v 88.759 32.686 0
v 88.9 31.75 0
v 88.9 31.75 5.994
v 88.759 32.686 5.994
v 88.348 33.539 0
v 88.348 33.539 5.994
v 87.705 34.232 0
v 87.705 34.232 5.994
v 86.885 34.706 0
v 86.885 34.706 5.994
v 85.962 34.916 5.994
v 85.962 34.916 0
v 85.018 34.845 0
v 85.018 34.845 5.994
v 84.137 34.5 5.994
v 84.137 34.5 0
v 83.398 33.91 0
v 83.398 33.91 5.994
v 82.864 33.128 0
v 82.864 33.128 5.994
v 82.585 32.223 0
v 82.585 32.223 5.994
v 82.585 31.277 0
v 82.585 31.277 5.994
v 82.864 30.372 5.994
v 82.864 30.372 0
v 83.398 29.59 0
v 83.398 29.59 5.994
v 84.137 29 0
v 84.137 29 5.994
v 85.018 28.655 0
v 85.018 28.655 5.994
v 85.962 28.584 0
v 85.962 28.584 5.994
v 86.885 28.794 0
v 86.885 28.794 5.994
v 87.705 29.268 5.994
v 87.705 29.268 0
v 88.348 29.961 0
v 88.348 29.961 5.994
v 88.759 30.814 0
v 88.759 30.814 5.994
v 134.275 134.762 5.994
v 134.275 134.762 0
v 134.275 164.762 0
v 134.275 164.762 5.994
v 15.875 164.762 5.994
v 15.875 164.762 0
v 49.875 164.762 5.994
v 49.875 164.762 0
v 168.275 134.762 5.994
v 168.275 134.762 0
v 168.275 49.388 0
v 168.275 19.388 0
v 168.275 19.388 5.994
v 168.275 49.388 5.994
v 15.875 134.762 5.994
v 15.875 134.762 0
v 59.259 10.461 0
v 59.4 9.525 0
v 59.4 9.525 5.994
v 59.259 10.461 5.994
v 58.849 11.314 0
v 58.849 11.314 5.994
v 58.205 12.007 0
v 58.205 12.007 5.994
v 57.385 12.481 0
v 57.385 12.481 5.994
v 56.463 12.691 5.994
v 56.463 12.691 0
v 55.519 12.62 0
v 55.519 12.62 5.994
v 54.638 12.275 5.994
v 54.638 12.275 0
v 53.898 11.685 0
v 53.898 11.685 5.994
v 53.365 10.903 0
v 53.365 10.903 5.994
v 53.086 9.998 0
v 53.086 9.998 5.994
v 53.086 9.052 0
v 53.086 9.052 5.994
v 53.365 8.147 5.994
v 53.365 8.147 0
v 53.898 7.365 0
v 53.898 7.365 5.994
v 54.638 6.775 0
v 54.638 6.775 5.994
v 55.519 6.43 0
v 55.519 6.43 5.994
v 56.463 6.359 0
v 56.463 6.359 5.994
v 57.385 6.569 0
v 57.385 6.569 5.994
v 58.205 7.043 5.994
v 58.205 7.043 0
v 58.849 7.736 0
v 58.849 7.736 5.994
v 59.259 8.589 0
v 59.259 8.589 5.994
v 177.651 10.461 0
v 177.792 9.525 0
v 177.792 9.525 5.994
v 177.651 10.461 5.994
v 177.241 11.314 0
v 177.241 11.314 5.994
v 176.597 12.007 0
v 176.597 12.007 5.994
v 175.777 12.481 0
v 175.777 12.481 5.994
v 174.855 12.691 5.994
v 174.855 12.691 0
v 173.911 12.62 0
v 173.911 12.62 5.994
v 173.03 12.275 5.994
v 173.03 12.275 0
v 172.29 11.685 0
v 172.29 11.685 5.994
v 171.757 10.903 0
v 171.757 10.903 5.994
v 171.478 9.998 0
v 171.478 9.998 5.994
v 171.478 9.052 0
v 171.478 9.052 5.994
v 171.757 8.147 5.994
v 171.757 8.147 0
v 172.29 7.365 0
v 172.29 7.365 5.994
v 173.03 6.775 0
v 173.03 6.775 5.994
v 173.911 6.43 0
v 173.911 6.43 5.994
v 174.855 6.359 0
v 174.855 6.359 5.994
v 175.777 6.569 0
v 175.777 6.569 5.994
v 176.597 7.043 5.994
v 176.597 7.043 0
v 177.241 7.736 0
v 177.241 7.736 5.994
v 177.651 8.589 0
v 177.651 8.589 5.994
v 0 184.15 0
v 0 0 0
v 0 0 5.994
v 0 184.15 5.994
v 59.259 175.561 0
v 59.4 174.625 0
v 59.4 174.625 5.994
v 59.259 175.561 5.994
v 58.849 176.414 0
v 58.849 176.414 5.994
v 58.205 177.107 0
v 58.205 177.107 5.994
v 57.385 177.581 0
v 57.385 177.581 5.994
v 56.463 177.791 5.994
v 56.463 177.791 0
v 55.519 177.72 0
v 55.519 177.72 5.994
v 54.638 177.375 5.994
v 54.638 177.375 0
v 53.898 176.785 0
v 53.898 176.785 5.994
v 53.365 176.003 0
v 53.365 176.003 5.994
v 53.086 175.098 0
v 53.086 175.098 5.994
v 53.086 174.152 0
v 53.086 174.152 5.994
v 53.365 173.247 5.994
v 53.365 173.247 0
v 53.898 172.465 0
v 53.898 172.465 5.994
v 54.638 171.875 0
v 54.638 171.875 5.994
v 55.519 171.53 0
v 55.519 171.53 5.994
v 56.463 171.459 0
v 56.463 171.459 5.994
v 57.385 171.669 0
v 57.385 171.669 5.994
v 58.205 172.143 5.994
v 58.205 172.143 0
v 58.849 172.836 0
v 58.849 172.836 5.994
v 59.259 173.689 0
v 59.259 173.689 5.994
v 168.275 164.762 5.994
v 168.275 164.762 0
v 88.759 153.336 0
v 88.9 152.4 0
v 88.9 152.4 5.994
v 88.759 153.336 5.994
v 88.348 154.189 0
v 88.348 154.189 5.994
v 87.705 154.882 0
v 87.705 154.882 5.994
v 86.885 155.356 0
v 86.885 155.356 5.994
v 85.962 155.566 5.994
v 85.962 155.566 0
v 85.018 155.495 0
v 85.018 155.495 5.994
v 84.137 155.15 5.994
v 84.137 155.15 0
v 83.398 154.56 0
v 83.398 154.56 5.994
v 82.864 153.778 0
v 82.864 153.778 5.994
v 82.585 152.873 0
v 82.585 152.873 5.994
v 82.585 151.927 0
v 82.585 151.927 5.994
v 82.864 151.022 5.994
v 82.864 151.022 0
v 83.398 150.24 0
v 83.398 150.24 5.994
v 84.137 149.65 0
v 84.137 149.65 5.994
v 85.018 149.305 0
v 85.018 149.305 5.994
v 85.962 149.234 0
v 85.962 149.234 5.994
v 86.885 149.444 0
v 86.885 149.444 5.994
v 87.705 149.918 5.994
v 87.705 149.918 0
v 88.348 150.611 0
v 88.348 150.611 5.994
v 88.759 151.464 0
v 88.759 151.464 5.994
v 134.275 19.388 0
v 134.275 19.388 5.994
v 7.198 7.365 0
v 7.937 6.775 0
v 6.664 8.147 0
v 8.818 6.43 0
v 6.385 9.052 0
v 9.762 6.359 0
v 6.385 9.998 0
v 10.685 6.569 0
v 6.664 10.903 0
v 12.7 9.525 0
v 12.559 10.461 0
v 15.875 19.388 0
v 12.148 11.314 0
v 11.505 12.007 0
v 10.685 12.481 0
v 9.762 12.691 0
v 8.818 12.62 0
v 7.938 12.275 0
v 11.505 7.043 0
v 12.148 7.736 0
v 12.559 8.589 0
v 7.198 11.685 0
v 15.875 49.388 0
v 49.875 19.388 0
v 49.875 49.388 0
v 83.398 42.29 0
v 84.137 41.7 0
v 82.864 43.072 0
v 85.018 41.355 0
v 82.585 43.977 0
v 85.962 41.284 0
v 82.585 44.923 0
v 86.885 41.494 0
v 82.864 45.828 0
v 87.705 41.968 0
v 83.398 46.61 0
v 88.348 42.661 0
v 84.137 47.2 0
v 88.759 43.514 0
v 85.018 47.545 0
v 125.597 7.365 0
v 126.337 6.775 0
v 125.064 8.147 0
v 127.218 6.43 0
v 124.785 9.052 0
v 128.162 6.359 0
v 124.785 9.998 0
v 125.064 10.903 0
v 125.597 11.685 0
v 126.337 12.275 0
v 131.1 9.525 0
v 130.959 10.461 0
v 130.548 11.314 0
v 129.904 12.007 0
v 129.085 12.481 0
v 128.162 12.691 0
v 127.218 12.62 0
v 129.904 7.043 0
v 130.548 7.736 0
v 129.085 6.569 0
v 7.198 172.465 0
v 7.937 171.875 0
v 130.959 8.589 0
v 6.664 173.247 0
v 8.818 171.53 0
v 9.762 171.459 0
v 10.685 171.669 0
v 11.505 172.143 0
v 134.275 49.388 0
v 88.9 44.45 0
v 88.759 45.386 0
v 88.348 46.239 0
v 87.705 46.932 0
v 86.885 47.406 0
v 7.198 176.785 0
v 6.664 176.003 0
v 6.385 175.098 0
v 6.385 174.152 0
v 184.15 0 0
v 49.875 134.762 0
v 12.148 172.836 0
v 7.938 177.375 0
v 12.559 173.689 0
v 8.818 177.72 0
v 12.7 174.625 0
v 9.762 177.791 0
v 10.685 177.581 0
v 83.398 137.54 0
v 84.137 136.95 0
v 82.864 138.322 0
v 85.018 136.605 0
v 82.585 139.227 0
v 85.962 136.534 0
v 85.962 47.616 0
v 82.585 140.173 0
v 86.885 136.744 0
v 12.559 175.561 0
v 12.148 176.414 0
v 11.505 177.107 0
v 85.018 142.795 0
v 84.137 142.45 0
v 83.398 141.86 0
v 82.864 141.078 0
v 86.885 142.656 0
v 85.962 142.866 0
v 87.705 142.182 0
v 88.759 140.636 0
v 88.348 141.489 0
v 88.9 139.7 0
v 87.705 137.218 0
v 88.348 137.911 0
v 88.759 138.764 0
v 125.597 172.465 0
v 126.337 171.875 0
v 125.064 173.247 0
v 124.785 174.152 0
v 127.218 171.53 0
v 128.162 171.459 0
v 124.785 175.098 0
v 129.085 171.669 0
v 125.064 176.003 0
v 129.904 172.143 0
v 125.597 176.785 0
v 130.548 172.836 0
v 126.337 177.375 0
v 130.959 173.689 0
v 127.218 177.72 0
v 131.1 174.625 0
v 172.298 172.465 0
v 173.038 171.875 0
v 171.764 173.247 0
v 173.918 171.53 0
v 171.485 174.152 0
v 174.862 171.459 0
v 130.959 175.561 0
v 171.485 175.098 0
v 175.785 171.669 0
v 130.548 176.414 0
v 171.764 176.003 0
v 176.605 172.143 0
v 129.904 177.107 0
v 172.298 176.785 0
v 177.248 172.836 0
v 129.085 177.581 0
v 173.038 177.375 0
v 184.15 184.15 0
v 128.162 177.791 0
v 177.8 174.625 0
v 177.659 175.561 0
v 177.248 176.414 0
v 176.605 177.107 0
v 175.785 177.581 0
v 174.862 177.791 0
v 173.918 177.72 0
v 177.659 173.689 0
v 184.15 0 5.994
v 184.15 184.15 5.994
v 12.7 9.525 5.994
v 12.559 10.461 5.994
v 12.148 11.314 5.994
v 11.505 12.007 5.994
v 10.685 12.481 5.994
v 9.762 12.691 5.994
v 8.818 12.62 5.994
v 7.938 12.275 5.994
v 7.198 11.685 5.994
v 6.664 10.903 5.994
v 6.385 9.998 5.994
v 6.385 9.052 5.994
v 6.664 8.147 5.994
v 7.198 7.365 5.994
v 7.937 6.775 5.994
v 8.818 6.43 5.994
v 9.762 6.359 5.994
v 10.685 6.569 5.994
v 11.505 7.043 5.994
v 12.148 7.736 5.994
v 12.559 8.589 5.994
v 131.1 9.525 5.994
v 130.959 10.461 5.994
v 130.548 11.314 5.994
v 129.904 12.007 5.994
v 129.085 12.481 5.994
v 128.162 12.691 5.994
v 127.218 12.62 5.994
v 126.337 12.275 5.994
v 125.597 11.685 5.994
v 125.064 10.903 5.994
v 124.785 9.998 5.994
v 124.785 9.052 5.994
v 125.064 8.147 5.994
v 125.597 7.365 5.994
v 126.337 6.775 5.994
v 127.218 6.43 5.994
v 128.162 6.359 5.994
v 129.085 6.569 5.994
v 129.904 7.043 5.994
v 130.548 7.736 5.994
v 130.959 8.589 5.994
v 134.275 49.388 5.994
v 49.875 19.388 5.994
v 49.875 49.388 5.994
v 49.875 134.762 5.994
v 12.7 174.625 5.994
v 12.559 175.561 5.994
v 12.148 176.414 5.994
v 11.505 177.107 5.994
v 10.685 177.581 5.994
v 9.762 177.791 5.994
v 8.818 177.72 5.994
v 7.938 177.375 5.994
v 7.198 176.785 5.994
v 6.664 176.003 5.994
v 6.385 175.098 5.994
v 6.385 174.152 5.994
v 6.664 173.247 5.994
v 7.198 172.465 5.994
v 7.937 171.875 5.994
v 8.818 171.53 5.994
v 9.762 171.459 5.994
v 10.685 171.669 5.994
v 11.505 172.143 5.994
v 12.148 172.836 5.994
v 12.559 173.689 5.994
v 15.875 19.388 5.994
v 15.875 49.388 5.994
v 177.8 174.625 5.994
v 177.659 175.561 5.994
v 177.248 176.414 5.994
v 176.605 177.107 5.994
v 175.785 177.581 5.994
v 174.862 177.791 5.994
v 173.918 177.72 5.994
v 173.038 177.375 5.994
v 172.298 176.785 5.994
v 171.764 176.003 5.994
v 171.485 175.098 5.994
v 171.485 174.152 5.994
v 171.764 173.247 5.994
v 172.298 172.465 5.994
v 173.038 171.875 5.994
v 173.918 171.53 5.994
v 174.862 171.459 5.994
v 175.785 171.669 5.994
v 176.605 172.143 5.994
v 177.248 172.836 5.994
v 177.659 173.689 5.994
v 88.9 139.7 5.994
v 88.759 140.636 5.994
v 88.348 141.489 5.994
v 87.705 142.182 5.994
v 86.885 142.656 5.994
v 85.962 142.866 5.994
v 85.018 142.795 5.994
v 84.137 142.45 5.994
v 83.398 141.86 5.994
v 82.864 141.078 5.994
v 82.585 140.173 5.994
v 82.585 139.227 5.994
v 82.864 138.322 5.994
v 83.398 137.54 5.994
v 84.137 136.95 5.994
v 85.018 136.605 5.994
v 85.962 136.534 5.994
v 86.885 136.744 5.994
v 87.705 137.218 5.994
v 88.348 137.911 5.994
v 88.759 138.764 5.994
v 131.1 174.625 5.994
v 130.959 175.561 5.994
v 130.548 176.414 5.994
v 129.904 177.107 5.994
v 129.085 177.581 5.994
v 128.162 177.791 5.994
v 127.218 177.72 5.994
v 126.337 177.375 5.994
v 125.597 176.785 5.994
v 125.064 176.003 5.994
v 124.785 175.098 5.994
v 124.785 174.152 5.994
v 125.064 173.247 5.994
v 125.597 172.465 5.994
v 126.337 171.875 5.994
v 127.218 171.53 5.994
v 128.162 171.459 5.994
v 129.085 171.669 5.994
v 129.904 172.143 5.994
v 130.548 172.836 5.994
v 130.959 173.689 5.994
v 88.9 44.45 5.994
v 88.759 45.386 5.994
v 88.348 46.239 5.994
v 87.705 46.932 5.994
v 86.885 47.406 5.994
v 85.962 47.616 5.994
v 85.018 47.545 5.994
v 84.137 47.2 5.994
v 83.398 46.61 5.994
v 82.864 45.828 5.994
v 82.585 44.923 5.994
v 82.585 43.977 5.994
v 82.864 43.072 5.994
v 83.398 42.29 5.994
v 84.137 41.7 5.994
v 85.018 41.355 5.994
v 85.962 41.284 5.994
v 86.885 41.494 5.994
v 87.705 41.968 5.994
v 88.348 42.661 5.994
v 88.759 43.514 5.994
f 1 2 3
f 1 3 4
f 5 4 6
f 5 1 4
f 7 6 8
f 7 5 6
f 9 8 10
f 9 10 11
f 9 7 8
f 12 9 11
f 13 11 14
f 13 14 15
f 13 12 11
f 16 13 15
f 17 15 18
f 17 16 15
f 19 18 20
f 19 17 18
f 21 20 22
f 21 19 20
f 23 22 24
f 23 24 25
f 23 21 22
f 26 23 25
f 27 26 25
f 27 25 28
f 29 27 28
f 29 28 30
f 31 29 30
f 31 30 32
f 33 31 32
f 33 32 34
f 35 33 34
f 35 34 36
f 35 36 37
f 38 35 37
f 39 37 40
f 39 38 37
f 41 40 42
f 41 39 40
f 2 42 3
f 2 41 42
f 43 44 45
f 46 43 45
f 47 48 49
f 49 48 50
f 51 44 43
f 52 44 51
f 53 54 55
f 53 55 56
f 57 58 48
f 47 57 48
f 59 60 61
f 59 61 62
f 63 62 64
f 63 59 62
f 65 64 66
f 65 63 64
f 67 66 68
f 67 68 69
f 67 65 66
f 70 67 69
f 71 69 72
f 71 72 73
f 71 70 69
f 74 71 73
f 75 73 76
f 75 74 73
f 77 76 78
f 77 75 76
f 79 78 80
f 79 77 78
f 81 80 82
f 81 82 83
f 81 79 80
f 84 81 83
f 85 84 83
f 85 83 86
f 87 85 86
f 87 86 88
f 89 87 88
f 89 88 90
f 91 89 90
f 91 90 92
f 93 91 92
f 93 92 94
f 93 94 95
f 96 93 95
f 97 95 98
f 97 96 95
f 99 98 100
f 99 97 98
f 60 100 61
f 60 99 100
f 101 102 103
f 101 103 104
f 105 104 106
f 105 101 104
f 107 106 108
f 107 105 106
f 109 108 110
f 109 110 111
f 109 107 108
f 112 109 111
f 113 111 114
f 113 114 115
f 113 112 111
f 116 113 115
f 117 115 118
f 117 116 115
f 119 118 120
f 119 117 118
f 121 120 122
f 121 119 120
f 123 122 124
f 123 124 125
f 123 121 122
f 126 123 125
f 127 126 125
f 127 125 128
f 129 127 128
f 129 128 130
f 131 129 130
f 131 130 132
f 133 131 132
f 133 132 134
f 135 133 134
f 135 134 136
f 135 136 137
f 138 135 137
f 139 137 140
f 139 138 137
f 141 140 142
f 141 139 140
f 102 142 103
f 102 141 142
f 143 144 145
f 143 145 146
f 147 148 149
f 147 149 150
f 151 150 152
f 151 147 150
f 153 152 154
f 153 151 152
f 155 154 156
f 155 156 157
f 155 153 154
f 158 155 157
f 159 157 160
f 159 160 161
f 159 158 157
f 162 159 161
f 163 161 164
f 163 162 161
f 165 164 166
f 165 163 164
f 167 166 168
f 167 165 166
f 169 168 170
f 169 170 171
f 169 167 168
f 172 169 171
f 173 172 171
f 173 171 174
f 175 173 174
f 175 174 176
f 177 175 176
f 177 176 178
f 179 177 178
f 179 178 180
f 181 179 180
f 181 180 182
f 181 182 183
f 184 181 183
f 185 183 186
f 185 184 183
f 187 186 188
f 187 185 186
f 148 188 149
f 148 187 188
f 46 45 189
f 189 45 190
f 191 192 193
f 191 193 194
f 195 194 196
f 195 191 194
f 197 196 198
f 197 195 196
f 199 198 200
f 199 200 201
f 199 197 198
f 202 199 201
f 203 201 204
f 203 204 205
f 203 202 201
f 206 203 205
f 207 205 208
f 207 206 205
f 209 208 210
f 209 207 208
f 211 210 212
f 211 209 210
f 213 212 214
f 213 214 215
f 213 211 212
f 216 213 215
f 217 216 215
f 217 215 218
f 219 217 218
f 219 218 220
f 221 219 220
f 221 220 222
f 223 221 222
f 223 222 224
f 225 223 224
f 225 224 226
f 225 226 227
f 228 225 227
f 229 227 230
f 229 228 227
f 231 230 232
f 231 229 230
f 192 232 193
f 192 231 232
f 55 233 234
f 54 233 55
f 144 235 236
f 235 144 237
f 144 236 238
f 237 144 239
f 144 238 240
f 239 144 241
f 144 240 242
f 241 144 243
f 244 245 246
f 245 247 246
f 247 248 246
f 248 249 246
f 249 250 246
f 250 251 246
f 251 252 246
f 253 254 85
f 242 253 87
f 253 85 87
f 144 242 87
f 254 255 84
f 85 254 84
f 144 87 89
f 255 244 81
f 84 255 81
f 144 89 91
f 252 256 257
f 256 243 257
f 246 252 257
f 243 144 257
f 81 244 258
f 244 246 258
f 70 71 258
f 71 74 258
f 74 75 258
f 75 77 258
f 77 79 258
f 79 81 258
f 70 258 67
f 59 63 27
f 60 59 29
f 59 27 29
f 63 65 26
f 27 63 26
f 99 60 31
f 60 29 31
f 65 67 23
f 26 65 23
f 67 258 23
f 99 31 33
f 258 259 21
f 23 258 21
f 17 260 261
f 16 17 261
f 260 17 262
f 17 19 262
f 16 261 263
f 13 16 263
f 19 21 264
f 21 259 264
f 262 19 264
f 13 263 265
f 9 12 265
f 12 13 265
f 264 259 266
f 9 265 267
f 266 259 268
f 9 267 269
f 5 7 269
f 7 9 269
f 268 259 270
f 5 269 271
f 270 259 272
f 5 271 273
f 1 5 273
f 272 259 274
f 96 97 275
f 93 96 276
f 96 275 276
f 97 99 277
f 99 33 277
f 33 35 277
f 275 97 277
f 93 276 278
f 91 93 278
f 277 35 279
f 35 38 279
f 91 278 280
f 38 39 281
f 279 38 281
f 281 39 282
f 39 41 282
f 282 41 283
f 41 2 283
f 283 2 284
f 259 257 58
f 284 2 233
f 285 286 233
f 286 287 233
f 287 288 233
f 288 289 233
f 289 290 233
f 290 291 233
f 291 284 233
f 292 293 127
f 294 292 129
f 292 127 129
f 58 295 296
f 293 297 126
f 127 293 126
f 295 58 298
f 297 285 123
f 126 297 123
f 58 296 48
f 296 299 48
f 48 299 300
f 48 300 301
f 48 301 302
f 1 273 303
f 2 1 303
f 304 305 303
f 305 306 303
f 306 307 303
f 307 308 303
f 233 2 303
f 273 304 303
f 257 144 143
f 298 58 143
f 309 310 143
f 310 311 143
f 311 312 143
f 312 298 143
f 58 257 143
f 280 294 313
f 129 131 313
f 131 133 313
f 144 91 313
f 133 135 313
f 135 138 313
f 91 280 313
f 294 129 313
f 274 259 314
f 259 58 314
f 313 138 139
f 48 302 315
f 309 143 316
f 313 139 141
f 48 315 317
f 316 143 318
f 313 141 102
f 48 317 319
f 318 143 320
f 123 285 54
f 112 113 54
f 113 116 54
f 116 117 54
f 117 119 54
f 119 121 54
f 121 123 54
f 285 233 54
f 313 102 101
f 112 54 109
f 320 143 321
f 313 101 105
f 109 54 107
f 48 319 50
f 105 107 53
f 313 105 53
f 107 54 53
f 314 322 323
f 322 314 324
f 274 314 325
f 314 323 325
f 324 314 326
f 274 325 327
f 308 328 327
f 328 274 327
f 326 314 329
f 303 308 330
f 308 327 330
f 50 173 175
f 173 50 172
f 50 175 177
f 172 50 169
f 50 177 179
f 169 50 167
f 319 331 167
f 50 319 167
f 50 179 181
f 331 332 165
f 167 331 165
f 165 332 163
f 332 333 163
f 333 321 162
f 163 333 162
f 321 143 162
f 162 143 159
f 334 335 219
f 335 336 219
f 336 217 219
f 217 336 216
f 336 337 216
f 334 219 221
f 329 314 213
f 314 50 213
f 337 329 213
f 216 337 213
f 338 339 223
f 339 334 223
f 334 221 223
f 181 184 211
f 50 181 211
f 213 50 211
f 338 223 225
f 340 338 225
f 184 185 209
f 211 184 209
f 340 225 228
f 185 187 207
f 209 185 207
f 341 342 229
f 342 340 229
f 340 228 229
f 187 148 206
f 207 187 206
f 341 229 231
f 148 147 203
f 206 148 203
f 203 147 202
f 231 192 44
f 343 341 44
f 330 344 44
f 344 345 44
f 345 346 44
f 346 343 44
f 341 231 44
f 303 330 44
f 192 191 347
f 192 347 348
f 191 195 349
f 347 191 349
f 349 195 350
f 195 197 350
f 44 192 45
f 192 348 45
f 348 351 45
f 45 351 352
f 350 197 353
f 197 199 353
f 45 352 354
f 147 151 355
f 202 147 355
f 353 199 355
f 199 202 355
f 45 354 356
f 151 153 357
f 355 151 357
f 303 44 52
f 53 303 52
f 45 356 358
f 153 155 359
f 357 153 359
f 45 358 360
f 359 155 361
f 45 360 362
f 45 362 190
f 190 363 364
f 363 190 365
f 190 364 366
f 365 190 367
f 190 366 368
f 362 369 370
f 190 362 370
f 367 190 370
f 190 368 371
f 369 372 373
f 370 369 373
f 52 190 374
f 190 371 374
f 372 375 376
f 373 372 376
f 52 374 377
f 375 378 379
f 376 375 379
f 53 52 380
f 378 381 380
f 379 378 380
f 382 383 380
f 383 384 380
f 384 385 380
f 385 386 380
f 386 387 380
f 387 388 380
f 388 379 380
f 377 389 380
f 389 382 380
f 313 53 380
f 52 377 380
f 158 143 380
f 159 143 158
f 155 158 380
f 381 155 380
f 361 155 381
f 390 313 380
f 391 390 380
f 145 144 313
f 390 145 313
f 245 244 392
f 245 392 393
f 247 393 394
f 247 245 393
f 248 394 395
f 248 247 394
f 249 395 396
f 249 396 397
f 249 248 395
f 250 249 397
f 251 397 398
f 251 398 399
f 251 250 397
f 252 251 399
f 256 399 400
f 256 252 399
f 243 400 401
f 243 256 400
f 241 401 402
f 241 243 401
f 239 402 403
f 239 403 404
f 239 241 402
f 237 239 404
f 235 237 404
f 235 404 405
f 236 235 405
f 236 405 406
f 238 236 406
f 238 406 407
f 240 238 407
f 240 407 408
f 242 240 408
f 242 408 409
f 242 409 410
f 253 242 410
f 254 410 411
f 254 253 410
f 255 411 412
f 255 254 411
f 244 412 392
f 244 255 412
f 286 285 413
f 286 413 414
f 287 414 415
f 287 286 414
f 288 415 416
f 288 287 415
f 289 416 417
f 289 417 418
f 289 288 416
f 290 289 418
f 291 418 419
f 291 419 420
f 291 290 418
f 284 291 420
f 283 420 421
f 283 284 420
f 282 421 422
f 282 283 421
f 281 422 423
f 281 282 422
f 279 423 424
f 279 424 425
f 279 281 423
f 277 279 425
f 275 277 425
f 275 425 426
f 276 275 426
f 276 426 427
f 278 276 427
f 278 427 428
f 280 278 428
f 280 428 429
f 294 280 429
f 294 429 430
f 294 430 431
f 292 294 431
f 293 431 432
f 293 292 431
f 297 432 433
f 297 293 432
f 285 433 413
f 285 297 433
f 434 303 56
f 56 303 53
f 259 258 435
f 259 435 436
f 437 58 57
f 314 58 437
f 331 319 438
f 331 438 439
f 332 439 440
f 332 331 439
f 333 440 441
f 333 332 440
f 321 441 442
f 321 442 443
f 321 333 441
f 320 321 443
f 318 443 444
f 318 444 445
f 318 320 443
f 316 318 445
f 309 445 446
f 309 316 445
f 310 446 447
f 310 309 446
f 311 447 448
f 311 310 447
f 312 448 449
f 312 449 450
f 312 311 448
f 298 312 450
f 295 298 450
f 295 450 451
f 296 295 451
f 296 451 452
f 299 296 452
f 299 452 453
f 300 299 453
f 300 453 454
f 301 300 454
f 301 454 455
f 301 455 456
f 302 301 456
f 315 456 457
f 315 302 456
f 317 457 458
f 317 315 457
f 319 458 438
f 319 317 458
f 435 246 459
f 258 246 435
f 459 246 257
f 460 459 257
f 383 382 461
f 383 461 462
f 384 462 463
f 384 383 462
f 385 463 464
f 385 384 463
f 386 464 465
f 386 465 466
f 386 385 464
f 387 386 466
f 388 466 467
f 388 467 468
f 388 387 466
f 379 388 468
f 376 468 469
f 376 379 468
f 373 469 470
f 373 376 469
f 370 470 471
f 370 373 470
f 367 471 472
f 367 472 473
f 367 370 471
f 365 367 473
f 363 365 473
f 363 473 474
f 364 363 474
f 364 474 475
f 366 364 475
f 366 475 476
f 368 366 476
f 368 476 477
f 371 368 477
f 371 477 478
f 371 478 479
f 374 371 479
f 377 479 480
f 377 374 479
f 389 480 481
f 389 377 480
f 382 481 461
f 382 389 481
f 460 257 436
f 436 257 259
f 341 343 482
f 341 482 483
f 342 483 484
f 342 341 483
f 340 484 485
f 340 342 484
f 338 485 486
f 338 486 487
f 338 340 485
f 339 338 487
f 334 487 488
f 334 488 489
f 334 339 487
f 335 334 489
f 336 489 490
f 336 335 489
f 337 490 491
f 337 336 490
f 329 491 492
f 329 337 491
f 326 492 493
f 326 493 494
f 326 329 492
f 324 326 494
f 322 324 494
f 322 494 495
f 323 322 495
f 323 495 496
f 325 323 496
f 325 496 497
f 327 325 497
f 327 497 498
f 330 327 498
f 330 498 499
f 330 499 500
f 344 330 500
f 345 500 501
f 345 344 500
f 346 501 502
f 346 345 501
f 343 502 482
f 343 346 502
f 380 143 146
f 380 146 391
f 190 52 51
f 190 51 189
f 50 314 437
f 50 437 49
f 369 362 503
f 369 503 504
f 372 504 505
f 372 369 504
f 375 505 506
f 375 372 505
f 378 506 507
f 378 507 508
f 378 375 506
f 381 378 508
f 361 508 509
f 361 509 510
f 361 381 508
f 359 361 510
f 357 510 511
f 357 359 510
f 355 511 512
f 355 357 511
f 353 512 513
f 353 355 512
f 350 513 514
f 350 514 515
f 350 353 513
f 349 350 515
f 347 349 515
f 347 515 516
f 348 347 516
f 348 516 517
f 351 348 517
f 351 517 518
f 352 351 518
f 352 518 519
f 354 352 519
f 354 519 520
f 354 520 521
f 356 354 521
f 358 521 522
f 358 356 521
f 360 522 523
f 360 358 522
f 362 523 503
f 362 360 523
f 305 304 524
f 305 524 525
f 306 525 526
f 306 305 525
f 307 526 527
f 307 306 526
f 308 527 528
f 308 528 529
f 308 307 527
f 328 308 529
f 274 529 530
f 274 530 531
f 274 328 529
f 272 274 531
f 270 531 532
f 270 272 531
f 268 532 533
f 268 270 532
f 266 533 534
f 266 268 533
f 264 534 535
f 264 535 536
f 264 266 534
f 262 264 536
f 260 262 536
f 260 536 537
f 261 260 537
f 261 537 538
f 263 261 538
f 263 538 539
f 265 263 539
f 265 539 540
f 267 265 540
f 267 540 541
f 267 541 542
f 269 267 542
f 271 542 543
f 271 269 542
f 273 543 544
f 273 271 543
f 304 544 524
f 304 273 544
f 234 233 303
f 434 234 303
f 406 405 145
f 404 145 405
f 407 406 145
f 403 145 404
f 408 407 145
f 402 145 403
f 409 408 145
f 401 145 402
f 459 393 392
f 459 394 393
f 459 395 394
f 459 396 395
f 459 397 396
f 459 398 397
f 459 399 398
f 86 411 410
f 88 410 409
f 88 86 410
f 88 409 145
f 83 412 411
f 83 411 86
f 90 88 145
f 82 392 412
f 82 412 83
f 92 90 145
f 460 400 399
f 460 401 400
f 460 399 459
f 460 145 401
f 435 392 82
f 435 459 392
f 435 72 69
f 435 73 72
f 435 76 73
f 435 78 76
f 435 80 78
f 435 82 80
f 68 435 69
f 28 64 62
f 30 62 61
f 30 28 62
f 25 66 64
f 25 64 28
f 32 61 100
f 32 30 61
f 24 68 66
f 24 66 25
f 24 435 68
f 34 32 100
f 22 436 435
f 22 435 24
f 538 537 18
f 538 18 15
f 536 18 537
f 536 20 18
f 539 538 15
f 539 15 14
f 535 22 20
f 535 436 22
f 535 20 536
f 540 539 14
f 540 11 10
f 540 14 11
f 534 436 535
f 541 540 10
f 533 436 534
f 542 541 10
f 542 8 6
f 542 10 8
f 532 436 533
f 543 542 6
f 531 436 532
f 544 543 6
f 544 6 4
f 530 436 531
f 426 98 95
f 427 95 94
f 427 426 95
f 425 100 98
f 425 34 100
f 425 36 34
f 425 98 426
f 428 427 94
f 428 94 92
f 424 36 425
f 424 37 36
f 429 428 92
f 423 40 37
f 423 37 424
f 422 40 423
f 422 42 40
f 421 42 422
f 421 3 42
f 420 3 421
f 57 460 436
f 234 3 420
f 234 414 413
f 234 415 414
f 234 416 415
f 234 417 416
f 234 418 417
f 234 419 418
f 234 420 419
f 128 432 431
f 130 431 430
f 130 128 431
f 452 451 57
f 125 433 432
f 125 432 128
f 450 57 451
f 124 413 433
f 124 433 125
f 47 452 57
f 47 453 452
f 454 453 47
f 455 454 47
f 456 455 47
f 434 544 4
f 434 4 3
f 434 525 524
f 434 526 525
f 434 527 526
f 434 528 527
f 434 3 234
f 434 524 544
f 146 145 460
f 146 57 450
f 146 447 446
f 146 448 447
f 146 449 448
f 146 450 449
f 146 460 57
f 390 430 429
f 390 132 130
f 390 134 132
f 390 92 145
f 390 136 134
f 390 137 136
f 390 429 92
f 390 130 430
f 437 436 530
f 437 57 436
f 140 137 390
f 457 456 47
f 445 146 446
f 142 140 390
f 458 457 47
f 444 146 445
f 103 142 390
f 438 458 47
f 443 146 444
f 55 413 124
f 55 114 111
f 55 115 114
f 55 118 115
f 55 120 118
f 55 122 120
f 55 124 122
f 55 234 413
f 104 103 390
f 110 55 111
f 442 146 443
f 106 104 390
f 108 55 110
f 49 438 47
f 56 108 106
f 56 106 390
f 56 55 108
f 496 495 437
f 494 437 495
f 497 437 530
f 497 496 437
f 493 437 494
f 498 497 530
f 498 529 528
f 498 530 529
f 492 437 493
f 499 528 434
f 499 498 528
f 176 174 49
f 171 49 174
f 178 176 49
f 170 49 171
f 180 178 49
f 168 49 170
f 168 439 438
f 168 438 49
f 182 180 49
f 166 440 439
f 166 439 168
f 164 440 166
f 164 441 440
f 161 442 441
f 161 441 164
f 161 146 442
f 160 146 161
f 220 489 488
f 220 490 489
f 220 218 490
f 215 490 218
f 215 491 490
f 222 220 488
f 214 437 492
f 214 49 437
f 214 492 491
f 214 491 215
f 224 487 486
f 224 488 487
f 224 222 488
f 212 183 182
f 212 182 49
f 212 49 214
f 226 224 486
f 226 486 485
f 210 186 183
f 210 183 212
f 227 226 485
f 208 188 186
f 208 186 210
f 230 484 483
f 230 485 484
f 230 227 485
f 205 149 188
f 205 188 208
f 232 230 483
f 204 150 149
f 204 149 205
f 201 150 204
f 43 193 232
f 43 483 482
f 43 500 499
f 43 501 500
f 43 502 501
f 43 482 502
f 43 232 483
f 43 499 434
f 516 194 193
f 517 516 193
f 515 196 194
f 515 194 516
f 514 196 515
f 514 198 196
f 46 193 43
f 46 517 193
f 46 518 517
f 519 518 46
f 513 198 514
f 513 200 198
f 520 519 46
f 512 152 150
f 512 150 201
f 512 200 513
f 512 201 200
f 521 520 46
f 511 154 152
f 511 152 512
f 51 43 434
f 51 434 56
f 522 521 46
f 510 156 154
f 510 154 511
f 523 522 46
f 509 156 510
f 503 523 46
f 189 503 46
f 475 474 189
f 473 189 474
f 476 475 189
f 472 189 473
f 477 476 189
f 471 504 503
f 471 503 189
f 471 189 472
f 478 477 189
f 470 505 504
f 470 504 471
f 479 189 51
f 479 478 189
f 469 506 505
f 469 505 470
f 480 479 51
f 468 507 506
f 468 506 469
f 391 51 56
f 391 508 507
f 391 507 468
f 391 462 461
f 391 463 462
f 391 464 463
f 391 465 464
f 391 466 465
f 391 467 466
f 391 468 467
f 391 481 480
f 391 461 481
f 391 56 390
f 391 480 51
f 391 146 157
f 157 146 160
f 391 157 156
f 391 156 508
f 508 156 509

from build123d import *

# Parameters (mm, degrees)
SKETCH1_W           = 184.15
SKETCH1_H           = 184.15
SKETCH1_R           = 3.175
SKETCH1_W_2         = 34
SKETCH1_H_2         = 30
BOSS_EXTRUDE1_DEPTH = 5.9944


with BuildPart() as part:
    # Sketch1 → Boss-Extrude1 (new body)
    with BuildSketch(Plane.XY):
        with Locations((92.075, 92.075)):
            Rectangle(SKETCH1_W, SKETCH1_H)
        with Locations((9.525, 174.625)):
            Circle(SKETCH1_R, mode=Mode.SUBTRACT)
        with Locations((56.22544, 174.625)):
            Circle(SKETCH1_R, mode=Mode.SUBTRACT)
        with Locations((127.92456, 174.625)):
            Circle(SKETCH1_R, mode=Mode.SUBTRACT)
        with Locations((174.625, 174.625)):
            Circle(SKETCH1_R, mode=Mode.SUBTRACT)
        with Locations((85.725, 152.4)):
            Circle(SKETCH1_R, mode=Mode.SUBTRACT)
        with Locations((85.725, 139.7)):
            Circle(SKETCH1_R, mode=Mode.SUBTRACT)
        with Locations((9.525, 9.525)):
            Circle(SKETCH1_R, mode=Mode.SUBTRACT)
        with Locations((85.725, 44.45)):
            Circle(SKETCH1_R, mode=Mode.SUBTRACT)
        with Locations((56.22544, 9.525)):
            Circle(SKETCH1_R, mode=Mode.SUBTRACT)
        with Locations((85.725, 31.75)):
            Circle(SKETCH1_R, mode=Mode.SUBTRACT)
        with Locations((127.92456, 9.525)):
            Circle(SKETCH1_R, mode=Mode.SUBTRACT)
        with Locations((174.61738, 9.525)):
            Circle(SKETCH1_R, mode=Mode.SUBTRACT)
        with Locations((32.87522, 149.76218)):
            Rectangle(SKETCH1_W_2, SKETCH1_H_2, mode=Mode.SUBTRACT)
        with Locations((32.87522, 34.38782)):
            Rectangle(SKETCH1_W_2, SKETCH1_H_2, mode=Mode.SUBTRACT)
        with Locations((151.27478, 149.76218)):
            Rectangle(SKETCH1_W_2, SKETCH1_H_2, mode=Mode.SUBTRACT)
        with Locations((151.27478, 34.38782)):
            Rectangle(SKETCH1_W_2, SKETCH1_H_2, mode=Mode.SUBTRACT)
    extrude(amount=BOSS_EXTRUDE1_DEPTH)


solid = part.part
